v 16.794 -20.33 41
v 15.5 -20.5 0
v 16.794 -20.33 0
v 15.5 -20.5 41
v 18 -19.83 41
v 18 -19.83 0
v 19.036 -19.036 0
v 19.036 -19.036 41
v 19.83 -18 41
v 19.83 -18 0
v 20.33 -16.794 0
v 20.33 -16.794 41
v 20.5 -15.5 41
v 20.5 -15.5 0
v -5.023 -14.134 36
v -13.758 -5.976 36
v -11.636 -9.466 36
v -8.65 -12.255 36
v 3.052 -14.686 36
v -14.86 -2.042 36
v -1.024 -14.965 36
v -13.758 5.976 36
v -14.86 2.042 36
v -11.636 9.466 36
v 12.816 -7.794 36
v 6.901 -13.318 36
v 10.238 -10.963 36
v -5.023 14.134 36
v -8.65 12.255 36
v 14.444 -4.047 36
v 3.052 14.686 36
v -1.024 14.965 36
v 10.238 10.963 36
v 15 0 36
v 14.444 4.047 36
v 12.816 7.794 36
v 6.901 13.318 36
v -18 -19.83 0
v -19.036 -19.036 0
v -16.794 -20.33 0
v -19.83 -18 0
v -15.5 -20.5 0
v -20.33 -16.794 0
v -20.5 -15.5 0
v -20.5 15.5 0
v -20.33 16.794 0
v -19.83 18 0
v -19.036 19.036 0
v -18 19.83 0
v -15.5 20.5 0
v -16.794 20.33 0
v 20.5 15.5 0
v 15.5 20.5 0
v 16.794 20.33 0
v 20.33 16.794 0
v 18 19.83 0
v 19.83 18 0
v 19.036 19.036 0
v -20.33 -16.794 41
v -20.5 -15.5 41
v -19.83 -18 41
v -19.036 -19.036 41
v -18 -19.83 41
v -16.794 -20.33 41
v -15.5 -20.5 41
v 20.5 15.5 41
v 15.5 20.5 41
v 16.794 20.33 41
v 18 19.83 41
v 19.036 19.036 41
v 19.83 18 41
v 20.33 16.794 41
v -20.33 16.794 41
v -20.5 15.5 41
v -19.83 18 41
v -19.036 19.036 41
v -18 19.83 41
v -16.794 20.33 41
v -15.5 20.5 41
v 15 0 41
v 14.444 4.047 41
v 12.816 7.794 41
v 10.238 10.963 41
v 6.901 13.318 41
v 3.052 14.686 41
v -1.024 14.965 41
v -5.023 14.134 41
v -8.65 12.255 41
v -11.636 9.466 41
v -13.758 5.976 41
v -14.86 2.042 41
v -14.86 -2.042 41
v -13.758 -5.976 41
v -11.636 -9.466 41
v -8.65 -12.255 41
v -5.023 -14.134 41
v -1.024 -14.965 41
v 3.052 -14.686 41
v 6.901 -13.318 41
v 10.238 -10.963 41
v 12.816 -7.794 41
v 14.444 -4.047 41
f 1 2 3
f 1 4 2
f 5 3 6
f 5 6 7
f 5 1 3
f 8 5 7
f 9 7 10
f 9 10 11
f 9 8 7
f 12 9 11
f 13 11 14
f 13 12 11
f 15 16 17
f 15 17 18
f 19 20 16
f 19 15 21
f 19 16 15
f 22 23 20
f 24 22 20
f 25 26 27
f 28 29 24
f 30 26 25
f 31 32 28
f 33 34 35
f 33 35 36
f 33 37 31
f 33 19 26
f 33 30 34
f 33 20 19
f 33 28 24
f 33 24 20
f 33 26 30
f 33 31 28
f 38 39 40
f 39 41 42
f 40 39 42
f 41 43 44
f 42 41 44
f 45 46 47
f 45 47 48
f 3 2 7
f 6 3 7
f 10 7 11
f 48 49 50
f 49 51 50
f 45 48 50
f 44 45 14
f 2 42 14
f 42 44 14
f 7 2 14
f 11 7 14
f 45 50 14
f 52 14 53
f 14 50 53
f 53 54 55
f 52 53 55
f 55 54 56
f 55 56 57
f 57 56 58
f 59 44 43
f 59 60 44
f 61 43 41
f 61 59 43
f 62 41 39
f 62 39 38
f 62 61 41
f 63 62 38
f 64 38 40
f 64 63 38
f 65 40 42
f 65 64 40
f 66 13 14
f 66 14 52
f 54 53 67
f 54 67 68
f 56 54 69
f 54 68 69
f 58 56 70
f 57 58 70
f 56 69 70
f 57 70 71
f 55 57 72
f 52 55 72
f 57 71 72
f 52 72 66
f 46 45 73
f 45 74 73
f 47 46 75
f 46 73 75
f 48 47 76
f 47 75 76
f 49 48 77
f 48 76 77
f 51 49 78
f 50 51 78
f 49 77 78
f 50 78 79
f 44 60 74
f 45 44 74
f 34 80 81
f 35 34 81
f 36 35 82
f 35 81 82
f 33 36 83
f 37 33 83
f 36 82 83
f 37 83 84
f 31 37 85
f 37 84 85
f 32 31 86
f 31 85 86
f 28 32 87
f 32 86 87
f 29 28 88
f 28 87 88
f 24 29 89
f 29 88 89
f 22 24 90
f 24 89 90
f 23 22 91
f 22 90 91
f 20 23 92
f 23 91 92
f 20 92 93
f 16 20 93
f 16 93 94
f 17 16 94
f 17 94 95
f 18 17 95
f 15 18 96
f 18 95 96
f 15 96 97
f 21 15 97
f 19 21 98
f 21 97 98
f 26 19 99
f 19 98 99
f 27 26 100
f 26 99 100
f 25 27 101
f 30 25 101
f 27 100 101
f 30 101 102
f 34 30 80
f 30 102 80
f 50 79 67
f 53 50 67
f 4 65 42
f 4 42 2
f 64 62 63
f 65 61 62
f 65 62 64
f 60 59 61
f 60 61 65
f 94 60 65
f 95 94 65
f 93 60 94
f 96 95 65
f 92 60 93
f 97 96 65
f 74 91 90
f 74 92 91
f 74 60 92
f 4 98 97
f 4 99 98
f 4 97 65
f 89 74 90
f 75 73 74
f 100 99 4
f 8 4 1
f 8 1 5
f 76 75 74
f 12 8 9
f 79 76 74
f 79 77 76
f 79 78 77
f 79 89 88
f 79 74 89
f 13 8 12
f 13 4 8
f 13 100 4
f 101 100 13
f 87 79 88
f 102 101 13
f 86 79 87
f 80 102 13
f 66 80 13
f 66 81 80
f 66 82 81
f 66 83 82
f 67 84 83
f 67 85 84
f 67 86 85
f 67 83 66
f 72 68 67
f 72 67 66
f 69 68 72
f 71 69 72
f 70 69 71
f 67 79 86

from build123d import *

# Parameters (mm, degrees)
SKETCH_1_W          = 41
SKETCH_1_H          = 41
EXTRUDE_1_DEPTH     = 41
SKETCH_2_R          = 15
CUT_EXTRUDE_1_DEPTH = 5
FILLET_1_R          = 5


with BuildPart() as part:
    # 草图1 → 凸台-拉伸1 (new body)
    with BuildSketch(Plane.XY):
        Rectangle(SKETCH_1_W, SKETCH_1_H)
    extrude(amount=EXTRUDE_1_DEPTH)

    # 草图2 → 切除-拉伸1 (cut)
    with BuildSketch(Plane.XY.offset(41)):
        Circle(SKETCH_2_R)
    extrude(amount=-CUT_EXTRUDE_1_DEPTH, mode=Mode.SUBTRACT)

    # 圆角1
    fillet_1_edges = [part.edges().sort_by_distance(p)[0] for p in [
        (20.5, -20.5, 20.5),
        (-20.5, -20.5, 20.5),
        (-20.5, 20.5, 20.5),
        (20.5, 20.5, 20.5),
    ]]
    fillet(fillet_1_edges, radius=FILLET_1_R)


solid = part.part
